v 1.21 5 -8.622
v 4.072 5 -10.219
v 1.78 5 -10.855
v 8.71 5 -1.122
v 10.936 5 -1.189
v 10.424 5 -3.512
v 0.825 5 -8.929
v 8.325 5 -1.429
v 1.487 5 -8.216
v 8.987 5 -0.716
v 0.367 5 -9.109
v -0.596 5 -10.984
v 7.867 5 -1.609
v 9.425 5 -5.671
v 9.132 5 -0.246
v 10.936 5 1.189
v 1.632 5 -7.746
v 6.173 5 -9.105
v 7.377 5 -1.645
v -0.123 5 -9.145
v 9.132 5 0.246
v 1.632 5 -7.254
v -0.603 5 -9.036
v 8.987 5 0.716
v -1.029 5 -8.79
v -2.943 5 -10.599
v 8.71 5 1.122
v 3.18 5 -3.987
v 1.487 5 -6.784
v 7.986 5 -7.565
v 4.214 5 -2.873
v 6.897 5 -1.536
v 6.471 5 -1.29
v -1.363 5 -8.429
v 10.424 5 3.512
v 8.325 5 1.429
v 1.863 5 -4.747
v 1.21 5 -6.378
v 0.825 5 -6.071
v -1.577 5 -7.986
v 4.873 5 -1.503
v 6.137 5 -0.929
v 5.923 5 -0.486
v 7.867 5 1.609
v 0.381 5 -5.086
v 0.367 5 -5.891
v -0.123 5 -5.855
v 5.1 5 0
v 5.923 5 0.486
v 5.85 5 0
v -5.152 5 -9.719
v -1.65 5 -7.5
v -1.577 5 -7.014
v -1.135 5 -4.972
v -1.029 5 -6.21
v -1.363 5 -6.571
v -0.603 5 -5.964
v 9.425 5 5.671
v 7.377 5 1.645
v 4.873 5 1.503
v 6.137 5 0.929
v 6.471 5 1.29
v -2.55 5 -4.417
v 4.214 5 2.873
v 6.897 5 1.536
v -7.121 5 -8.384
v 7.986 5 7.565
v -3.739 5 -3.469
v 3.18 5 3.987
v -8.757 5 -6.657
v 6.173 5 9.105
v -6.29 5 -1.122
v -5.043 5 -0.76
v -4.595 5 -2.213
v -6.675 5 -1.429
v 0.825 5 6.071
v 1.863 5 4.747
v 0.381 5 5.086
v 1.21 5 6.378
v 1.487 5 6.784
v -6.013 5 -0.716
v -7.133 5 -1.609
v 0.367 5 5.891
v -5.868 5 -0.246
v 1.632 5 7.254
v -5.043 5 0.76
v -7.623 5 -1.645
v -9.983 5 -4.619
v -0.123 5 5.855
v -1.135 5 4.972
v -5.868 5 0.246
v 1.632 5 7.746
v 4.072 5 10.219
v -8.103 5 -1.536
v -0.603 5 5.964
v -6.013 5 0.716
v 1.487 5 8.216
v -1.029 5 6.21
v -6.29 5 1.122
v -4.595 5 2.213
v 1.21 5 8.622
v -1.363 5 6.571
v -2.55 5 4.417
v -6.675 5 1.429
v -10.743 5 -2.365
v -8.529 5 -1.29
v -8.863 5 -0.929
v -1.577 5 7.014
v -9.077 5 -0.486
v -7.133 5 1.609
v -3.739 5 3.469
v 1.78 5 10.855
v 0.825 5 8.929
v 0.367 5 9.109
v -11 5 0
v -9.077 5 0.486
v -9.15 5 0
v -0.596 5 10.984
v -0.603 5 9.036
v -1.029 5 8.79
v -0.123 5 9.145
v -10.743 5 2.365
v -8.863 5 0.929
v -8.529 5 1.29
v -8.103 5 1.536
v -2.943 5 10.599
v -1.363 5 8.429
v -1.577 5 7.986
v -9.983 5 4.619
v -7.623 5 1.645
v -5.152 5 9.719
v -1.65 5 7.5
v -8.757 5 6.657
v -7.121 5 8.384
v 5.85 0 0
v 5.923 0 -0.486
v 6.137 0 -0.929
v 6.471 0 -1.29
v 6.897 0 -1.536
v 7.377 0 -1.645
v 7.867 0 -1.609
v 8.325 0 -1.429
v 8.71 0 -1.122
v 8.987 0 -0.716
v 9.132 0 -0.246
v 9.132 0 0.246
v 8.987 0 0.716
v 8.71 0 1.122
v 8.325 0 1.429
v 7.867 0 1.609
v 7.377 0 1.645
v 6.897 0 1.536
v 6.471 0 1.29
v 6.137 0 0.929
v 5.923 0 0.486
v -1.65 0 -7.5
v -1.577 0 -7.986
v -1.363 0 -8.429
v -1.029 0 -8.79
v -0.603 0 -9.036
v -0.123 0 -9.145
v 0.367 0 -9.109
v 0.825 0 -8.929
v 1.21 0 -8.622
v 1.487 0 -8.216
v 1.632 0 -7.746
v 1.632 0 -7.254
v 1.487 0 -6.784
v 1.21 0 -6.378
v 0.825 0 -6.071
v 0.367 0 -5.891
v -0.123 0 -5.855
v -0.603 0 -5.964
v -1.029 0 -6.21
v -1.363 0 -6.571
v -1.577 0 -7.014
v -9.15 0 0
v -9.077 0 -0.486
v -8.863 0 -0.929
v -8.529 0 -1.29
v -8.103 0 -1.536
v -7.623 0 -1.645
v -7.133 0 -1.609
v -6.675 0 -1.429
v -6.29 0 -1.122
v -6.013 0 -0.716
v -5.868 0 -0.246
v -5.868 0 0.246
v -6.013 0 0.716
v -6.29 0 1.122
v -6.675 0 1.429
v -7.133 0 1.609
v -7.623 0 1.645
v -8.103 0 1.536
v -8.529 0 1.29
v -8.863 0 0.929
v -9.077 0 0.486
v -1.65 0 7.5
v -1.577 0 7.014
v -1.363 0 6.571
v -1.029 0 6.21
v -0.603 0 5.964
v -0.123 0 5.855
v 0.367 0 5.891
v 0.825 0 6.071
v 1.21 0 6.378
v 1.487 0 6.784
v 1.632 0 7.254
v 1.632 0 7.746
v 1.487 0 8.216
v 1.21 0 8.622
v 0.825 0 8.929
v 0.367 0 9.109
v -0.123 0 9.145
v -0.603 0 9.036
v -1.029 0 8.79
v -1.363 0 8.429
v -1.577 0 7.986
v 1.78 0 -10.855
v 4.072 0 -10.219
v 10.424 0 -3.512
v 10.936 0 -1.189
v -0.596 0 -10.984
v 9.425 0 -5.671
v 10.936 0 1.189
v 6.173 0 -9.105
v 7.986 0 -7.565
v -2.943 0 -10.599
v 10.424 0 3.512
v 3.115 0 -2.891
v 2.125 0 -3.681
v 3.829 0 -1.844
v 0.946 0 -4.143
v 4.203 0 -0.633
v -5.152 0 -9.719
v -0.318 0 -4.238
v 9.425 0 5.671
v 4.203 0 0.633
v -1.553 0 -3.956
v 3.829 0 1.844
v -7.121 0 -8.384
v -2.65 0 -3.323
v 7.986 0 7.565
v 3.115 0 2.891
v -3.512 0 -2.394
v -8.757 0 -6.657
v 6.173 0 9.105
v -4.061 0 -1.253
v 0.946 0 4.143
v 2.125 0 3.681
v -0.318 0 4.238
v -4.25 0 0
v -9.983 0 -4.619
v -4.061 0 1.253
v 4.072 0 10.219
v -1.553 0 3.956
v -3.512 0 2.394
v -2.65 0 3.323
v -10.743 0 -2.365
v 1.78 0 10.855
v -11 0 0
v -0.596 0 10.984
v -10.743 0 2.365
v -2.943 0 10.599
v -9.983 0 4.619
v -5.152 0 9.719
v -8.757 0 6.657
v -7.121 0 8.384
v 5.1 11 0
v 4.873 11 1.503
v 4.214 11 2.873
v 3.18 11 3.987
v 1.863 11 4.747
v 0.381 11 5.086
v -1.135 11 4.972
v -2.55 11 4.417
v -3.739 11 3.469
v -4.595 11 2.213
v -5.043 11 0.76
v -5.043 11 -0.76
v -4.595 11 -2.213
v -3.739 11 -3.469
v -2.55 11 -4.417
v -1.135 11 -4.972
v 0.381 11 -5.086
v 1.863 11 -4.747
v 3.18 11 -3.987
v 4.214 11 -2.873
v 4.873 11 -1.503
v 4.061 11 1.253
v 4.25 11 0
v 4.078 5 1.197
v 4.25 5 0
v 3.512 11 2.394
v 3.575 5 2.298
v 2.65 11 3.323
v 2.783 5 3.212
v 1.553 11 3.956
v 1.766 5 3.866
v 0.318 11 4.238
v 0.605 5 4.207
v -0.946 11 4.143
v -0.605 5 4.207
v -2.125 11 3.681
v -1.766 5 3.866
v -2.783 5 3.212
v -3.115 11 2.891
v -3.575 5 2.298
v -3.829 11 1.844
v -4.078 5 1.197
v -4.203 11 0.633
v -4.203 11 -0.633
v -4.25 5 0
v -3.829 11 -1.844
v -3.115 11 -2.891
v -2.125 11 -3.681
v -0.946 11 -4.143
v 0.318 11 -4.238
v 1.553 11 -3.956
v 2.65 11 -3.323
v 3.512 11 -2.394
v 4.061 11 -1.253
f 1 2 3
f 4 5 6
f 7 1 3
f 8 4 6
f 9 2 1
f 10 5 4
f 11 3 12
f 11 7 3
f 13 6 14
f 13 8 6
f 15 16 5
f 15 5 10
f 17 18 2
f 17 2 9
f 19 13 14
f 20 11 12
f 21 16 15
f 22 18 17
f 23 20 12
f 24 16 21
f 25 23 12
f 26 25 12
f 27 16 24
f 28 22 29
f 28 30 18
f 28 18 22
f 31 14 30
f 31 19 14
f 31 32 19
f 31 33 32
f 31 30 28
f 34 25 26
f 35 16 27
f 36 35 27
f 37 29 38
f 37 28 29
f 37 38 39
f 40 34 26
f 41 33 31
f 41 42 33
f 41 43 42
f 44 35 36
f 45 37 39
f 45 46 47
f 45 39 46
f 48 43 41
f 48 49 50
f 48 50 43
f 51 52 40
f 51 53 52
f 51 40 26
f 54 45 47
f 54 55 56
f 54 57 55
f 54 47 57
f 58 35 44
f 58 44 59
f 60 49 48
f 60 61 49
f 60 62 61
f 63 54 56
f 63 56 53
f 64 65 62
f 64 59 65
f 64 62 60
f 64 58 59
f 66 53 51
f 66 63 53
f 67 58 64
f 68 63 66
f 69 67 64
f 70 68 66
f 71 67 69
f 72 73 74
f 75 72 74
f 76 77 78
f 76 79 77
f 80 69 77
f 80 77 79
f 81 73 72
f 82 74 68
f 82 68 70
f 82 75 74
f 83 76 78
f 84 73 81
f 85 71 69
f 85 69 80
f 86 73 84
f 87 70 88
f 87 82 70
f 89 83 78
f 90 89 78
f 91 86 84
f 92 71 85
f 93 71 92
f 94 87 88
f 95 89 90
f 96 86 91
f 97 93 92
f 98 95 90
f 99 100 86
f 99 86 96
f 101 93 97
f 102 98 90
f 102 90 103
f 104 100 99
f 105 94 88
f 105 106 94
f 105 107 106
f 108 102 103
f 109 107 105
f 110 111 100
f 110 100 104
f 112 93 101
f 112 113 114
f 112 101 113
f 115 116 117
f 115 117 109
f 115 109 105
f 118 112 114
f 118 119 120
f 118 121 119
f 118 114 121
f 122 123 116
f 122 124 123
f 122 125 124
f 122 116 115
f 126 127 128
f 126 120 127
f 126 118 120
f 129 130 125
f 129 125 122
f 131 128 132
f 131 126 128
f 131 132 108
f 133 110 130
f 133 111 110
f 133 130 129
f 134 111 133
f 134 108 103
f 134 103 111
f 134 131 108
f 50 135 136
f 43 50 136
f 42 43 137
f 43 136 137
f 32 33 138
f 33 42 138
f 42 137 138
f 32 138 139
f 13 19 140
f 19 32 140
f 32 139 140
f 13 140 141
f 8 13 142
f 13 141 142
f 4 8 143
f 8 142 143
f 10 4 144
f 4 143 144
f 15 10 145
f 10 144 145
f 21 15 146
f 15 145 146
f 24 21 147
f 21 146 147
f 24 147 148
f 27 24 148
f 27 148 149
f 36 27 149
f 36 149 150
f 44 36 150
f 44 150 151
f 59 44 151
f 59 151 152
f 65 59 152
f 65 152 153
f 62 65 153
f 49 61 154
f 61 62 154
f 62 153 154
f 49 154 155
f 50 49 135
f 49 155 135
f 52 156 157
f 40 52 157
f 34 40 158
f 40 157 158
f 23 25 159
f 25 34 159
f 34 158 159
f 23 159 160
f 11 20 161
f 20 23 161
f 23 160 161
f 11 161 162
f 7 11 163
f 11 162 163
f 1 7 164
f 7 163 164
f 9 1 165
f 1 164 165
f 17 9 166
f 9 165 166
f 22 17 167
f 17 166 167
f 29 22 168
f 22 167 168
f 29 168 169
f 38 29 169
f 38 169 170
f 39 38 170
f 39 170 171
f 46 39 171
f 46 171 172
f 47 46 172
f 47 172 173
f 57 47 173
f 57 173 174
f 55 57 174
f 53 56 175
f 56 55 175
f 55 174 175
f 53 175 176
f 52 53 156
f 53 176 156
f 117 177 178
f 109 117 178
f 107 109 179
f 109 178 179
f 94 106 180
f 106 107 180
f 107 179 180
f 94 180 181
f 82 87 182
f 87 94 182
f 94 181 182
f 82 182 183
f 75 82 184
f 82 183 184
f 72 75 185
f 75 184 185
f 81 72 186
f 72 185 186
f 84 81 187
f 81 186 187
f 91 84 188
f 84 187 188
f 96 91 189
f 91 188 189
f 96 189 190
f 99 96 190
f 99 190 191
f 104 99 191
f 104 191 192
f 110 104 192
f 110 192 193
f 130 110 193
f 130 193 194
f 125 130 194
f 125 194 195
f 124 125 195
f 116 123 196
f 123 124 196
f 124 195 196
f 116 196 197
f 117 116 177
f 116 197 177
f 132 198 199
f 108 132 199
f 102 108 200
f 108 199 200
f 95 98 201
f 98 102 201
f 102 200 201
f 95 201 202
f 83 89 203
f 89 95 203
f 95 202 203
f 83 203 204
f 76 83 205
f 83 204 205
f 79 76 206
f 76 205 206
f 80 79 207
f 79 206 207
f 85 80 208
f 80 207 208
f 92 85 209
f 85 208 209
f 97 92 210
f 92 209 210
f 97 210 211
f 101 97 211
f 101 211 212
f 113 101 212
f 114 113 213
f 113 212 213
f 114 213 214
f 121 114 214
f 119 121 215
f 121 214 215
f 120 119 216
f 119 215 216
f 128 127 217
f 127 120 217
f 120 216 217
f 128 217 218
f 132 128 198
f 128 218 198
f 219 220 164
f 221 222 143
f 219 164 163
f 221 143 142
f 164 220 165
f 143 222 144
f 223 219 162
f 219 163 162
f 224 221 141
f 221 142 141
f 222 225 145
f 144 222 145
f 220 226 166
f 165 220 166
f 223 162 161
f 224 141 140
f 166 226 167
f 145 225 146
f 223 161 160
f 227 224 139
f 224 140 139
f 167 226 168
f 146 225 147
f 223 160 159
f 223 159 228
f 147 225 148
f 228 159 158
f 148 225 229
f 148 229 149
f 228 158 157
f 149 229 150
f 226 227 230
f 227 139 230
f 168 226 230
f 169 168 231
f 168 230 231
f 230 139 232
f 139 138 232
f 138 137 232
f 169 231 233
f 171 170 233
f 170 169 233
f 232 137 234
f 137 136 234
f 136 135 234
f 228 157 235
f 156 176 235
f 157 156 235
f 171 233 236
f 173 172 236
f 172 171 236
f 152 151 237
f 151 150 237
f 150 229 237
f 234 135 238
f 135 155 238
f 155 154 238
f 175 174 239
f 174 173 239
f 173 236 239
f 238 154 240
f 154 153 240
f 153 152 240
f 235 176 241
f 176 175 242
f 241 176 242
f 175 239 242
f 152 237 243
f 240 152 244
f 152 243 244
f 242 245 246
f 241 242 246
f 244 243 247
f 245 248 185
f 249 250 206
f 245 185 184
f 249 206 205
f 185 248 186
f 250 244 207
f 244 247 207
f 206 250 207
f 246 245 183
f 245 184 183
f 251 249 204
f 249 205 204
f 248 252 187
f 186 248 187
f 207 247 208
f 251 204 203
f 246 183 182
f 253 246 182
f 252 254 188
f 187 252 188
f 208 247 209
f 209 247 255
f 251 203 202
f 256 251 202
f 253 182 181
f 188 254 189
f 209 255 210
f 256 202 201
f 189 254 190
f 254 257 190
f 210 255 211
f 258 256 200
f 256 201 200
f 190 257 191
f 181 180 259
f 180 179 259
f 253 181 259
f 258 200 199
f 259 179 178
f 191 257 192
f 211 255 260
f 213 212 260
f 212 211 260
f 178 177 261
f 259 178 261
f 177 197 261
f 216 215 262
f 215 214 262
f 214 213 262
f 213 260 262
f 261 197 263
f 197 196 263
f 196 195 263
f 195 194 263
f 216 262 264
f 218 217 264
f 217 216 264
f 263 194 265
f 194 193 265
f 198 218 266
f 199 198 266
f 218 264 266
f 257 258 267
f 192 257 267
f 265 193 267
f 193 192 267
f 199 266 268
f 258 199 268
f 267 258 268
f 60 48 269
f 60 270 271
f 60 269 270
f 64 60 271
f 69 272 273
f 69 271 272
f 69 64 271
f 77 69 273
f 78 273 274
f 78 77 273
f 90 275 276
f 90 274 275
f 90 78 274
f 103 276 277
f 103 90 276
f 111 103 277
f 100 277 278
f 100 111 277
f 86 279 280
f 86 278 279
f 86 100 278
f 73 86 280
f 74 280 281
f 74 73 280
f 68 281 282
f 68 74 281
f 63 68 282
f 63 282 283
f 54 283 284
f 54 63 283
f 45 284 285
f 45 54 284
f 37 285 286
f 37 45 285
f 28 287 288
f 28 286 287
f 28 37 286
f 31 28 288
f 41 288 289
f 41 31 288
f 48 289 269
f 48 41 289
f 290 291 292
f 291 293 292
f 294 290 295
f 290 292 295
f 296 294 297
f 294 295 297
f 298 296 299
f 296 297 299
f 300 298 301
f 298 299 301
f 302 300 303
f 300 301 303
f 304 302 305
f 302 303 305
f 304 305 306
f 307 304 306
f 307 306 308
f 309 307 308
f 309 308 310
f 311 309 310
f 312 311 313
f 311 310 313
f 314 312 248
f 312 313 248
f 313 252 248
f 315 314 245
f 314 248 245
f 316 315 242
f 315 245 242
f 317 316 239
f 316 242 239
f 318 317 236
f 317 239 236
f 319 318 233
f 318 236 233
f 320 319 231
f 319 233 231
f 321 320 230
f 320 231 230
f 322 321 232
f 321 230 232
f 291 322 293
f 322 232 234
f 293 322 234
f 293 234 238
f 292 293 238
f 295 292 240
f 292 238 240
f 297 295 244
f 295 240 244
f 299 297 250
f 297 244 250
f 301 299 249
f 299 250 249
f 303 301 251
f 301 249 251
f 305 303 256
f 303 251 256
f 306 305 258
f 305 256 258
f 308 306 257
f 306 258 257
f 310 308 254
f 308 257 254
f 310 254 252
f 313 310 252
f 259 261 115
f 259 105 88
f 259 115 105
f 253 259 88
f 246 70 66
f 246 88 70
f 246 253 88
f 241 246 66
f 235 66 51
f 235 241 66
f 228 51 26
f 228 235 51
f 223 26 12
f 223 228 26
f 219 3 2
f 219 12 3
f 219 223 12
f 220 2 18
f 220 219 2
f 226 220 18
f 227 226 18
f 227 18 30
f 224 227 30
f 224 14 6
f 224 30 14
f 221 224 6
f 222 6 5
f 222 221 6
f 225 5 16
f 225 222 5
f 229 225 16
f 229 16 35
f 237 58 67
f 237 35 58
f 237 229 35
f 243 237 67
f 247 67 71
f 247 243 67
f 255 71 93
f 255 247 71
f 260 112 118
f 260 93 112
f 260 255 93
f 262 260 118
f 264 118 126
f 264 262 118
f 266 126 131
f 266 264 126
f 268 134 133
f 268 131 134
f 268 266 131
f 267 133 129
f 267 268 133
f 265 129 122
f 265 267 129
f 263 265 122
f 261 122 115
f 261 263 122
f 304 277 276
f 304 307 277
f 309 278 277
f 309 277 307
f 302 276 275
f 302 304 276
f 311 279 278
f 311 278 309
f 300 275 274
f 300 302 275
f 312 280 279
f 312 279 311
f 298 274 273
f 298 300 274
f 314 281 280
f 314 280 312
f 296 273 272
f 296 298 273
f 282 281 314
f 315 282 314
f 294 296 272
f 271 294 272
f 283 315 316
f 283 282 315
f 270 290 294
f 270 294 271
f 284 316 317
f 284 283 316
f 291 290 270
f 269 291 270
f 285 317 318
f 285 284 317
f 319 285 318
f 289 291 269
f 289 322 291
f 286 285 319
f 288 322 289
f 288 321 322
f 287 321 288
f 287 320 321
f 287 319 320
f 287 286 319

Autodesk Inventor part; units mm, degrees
ref_plane "YZ Plane" through (0, 0, 0) normal (1, 0, 0) x (0, 1, 0)
ref_plane "XZ Plane" through (0, 0, 0) normal (0, 1, 0) x (-1, 0, 0)
ref_plane "XY Plane" through (0, 0, 0) normal (0, 0, 1) x (1, 0, 0)
sketch "Sketch1" plane through (0, 0, 0) normal (0, 1, 0) x (-1, 0, 0)
  circle A0 centre (0, 0) radius 11
  circle A1 centre (0, 0) radius 4.25
  circle A2 centre (0, -7.5) radius 1.65
  circle A3 centre (7.5, 0) radius 1.65
  circle A4 centre (0, 7.5) radius 1.65
  circle A5 centre (-7.5, 0) radius 1.65
  dimension "d0" = 22
  dimension "d1" = 8.5
  dimension "d2" = 3.3
  dimension "d3" = 7.5
  dimension "d6" = 360
extrude "Extrusion1" add sketch "Sketch1" along normal blind 5
sketch "Sketch2" plane through (0, 5, 0) normal (0, 1, 0) x (1, 0, 0)
  circle A0 centre (0, 0) radius 4.25 projected
  circle A1 centre (0, 0) radius 5.1
  dimension "d10" = 10.2
extrude "Extrusion2" add sketch "Sketch2" along normal blind 6
properties part number "ACOPLE_NUEVO_iMPOVISDO" material "Steel, Mild, Welded"
